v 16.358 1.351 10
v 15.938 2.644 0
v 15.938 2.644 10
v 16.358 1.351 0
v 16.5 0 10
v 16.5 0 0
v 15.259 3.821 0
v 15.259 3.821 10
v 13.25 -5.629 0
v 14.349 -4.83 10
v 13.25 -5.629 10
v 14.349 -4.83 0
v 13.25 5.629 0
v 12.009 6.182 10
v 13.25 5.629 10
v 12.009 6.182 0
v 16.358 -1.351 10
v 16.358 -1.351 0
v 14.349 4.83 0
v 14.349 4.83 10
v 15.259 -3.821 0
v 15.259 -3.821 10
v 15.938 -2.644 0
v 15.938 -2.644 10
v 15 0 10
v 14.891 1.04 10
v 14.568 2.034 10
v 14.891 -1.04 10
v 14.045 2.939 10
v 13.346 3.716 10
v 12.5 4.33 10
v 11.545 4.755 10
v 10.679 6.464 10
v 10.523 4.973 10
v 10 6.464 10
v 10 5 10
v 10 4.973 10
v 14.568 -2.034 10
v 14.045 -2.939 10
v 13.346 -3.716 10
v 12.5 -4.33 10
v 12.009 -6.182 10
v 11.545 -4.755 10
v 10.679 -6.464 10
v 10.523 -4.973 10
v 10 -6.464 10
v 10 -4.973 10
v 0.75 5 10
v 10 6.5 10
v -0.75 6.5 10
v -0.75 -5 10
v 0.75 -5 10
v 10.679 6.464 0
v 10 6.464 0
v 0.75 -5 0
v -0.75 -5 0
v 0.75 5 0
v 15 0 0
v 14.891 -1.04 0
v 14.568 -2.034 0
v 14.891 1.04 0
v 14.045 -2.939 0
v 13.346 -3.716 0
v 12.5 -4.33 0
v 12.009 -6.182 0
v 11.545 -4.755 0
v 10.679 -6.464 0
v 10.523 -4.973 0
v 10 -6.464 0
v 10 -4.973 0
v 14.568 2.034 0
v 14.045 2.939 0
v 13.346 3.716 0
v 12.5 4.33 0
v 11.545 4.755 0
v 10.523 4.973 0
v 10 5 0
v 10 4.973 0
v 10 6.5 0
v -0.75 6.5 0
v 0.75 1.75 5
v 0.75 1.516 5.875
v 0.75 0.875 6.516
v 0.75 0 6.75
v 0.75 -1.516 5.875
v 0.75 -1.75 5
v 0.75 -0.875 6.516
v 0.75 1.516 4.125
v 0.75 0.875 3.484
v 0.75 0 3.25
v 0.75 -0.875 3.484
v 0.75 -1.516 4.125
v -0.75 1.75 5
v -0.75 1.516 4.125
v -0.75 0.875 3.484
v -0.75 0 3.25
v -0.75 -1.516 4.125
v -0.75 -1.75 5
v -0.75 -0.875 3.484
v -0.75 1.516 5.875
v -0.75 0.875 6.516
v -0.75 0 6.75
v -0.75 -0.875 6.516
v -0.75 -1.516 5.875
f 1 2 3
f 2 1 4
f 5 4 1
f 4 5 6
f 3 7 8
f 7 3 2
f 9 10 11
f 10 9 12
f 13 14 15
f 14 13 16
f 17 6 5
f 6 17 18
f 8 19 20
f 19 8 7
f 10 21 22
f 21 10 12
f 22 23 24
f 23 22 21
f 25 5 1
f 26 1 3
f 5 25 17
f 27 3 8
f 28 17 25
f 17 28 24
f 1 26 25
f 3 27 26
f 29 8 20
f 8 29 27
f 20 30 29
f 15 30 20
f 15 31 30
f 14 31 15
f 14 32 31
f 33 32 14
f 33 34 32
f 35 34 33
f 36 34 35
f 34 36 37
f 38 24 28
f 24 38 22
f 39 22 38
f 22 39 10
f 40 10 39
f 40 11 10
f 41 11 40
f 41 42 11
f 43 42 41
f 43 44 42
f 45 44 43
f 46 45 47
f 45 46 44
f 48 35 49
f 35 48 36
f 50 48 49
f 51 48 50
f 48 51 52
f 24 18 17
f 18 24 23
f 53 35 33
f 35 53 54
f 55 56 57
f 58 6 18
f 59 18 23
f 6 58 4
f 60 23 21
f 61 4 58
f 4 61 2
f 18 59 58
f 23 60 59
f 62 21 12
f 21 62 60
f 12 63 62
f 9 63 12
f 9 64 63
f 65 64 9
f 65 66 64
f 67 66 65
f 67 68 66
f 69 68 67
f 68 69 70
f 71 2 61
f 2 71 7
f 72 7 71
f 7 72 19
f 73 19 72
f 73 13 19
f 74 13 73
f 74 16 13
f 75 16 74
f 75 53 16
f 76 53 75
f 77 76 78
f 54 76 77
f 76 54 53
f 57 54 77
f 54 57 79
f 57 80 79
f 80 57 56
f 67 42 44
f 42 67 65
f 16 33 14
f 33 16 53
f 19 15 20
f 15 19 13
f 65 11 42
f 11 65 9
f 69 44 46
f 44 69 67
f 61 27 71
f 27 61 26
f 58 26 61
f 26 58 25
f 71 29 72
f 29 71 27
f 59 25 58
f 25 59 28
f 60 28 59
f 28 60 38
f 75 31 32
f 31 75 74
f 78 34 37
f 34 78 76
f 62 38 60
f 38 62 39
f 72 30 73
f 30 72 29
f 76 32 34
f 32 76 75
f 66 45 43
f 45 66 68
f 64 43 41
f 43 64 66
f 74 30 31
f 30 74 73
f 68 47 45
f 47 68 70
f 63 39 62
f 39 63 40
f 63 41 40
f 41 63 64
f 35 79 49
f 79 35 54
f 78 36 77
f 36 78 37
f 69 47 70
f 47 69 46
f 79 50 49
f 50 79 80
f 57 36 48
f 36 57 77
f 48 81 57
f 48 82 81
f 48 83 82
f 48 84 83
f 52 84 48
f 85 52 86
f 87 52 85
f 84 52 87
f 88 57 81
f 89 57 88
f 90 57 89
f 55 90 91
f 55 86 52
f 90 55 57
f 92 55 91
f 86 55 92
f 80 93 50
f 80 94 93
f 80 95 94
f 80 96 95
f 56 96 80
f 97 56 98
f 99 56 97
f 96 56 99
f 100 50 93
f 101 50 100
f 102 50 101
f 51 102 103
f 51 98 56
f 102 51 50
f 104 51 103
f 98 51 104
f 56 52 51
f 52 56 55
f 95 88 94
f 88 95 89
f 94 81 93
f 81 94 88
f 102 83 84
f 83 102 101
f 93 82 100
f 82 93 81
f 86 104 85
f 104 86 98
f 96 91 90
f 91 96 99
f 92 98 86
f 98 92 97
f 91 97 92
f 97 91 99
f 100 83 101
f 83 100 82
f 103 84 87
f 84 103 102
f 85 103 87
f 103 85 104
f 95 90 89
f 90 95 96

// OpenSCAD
// file: common.scad
//include <RatsoShapeLibrary.scad>



/*
Define settings for each nut/bolt type here
*/

// ### layer height of the printer ###
printer_layer_height = 0.4;

// kludge factor for different print nozzles
printer_oversize = 0.5; // 0.35 nozzle use 0.3; 0.6 nozzle use 0.?
printer_oversizeArc = 0.2; // 0.35 nozzle = ???; 0.6 nozzle = 0.2


// ### M3 ###

M3_boltDiameter = 3.0 + printer_oversize; // actual 3.0
M3_boltDiameterArc = 3.0 + printer_oversizeArc; // used for rotary extruded bolt channel
M3_boltHeadDiameter = 6.0 + printer_oversize; // actual 6
M3_nutHeight = 2.4 + printer_oversize; // actual 2.4
M3_lockNutHeight = 4.0 + printer_oversize; // actual 4.0
M3_nutDiameterMin = 5.5 + printer_oversize; // actual 5.5
M3_nutDiameterMax = (5.5*(1/sin(60))) + printer_oversize; // actual 6
M3_nutDiameterArc = 5.5; // used for rotary extruded nut channel

// eventually standardize this interface??, that would allow for easy switching of bolt/nut sizes
M3_dim = [M3_boltDiameter,M3_nutDiameterMin,M3_nutDiameterMax,M3_nutHeight];


// ### M2 ###

M2_boltDiameter = 2.0 + printer_oversize; // actual 2.0
M2_boltHeadDiameter = 4.0 + printer_oversize; // actual 4
M2_nutHeight = 1.6 + printer_oversize; // actual 1.6
M2_nutDiameterMin = 3.8 + printer_oversize; // actual 4
M2_nutDiameterMax = (4.0*(1/sin(60))) + printer_oversize; // actual 4.5

// eventually standardize this interface??, that would allow for easy switching of bolt/nut sizes
M2_dim = [M2_boltDiameter,M2_nutDiameterMin,M2_nutDiameterMax,M2_nutHeight];

// ### M8 ###
M8_rodDiameter = 8 + printer_oversize;

// ### PI ###
pi = 3.14159265359;



// ### shaft sizes for tight fit ###
woodDowel_quarterInch_diameter = 7.1;
woodDowel_halfInch_diameter = 13.5;
stepperMotor_diameter = 5.0 + printer_oversize; // actual 5.0



//--------




// =========================================================

//trapNutDie(channelHeight=20, holeLength=50, holeOffset=15 );
//trapNutDie(channelHeight=0 ,holeLength=15, holeOffset=0, nutOffset=0 );
// ** this is a brand-new function
module trapNutDie(
	channelHeight=15, 
	holeLength=10, 
	holeOffset=0, 
	nutOffset=0, 
	boltHoleRes=12,
	boltRadius = M3_boltDiameter/2, // DEPRICATE
	mType = 0,
	boltDiameter = M3_boltDiameter,
	nutHeight = M3_nutHeight,
	nutDiameterMin = M3_nutDiameterMin,
	nutDiameterMax = M3_nutDiameterMax,
	horizontal = false // should add a support to the bolt hole, AND (###TODO###) make the nut height a little higher
	){

	if(!horizontal){
		// hex-hole for the nut
		translate([0,-(nutHeight/2),-nutOffset]) rotate([-90,30,0]) cylinder(r=nutDiameterMax/2, h=nutHeight, $fn=6);
		// channel the nut drops into
		translate([-nutDiameterMin/2,-(nutHeight/2),0]) cube([nutDiameterMin,nutHeight,channelHeight]);
	}else{
		// hex-hole for the nut
		translate([0,-(nutHeight/2),-nutOffset]) rotate([-90,30,0]) cylinder(r=nutDiameterMax/2, h=nutHeight+printer_layer_height, $fn=6);
		// channel the nut drops into
		translate([-nutDiameterMin/2,-(nutHeight/2),0]) cube([nutDiameterMin,nutHeight+printer_layer_height,channelHeight]);
	}

	difference(){
		// bolt hole
		translate([0,-(holeLength/2)+holeOffset,0]) rotate([-90,0,0]) cylinder(r=boltDiameter/2, h=holeLength, $fn=boltHoleRes);
		if(horizontal){
			// cutout slice for support (if horizontal)
			rotate([-90,0,0]) translate([0,0,(nutHeight/2)+0.001]) cylinder(r=(boltDiameter/2)+1, h=printer_layer_height*2);
		}
	}
	
}

// =================================

//stumpWithTrapNut(shaftDiameter=stepperMotor_diameter, stumpWallThick=6, nutBlockThick=12);
//stumpWithTrapNut(shaftDiameter=16 + printer_oversize ); // shaft collar for Chad's drum stand
//stumpWithTrapNut(shaftDiameter=woodDowel_halfInch_diameter, stumpWallThick=8, nutBlockThick=0);
//stumpWithTrapNut(shaftDiameter=woodDowel_quarterInch_diameter); // shaftDiameter was 7.3, but a little too loose


module stumpWithTrapNut(
	shaftDiameter = 7.3,
	stumpWallThick = 4,
	nutBlockThick = 8,
	){

	shaftRadius = shaftDiameter/2;
	stumpRadius = shaftRadius + stumpWallThick;
	stumpHeight = 10;

	nutBlockWidth = M3_nutDiameterMax+stumpWallThick;
	nutBlockOffsetY = stumpRadius + nutBlockThick - stumpWallThick;
	stumpTrapNutOffsetY = shaftRadius + ( max( stumpWallThick, nutBlockThick ) / 2.5 );  //nutBlockOffsetY - (nutBlockThick/2); //
	stumpTrapNutOffsetZ = stumpHeight/2;

	trapNutBoltHoleLength = max( nutBlockThick, stumpWallThick );

		// nut stump
			translate([0,0,0]) difference(){
				union(){
					// stump
					translate([0,0,0]) cylinder(r=stumpRadius, h=stumpHeight, center=false);
					// nut block
					translate([-nutBlockWidth/2,-nutBlockOffsetY,0]) cube([nutBlockWidth,nutBlockThick,stumpHeight]);
				}
				// motor shaft
				translate([0,0,(stumpHeight)/2]) cylinder(r=shaftRadius, h=stumpHeight+1, center=true, $fn=shaftDiameter*3);
				// trap nut
				rotate([0,0,0]) translate([0,-stumpTrapNutOffsetY, stumpHeight-stumpTrapNutOffsetZ]) rotate([0,0,0]) trapNutDie(channelHeight=10 ,holeLength=trapNutBoltHoleLength*2, holeOffset=(-trapNutBoltHoleLength)/2 ); //holeOffset=(length/2)+(r1/2)
			} // translate difference
}
// main file
//include<RatsoShapeLibrary.scad>
include<common.scad>


bodyWallThick = 1.5;

aaaBatteryRadius = 5.5;
aaaBatteryLength = 44; // 44 for the battery + spring compression
aaaTerminalWidth = 9; // actual 8; width and height same
aaaTerminalThick = 1.6;
aaaTerminalTabWallWidth = 3.5; 
aaaTerminalTabWallThick = 1.6; 
aaaTerminalTabWallRatio = 0.3; // where the triangle split occurs
//aaaTerminalOpeningWidth1 = (aaaBatteryRadius*2) - 1;
aaaTerminalOpeningWidth = 7;

aaaBatteryCaseSizeOuter = [ 
	(aaaBatteryRadius*2)+(bodyWallThick*2), 
	bodyWallThick+aaaTerminalThick+aaaTerminalTabWallThick+aaaBatteryLength+aaaTerminalThick+aaaTerminalTabWallThick+bodyWallThick, 
	(aaaBatteryRadius*2)+(bodyWallThick*1) 
];

motorBodyDiameter = 7; // actual 7.0
motorBodyLength = 17; 
motorRearPadding = 5; 
motorRearNarrow = 4;
motorShaftRadius = 13;
motorShaftDiameter = motorShaftRadius*2; // should be called "shaftClearance" includes weight, etc. - total clearance, just use the maximum, same as battery
motorShaftLength = 7; // again, total clearance
motorOverallLength = motorRearPadding + motorBodyLength + motorShaftLength;

shaftWeightWallThick = 1.5;
//shaftWeightBaseThick = 0.0;
shaftWeightLength = 5; // the thickness of the weight
shaftWeightIR = 3.53; // motor diam is 7
shaftWeightOR = shaftWeightIR + shaftWeightWallThick; // shaftWeightIR + shaftWeightWallThick;
shaftWeightCutOffset = 1.5; // from center
shaftWeightTailLength = 8;
shaftWeightTailThick = 10;
shaftWeightTailRingIR = 0; // for extra weight
shaftWeightRes = 45;



motorCaseSizeOuter = [ 
	(aaaBatteryRadius*2)+(bodyWallThick*2), 
	bodyWallThick+motorOverallLength+bodyWallThick, 
	(aaaBatteryRadius*2)+(bodyWallThick*1)
];



flexMotorMountBoltHoleOffset = 1; // from center


mountRingOR = 5;
mountRingIR = 2;
caseMountLoopHeight = 3;
caseMountLoopOffsetX = 6;
caseMountLoopOffsetY = mountRingOR;

vibroBotBodySizeOuter = [ 
	(aaaBatteryRadius*2)+(bodyWallThick*2), 
	bodyWallThick+aaaTerminalThick+aaaTerminalTabWallThick+aaaBatteryLength+aaaTerminalThick+aaaTerminalTabWallThick+bodyWallThick+motorOverallLength+bodyWallThick, 
	//bodyWallThick+aaaTerminalThick+aaaTerminalTabWallThick+aaaBatteryLength+aaaTerminalThick+aaaTerminalTabWallThick+bodyWallThick+motorBodyLength, 
	(aaaBatteryRadius*2)+(bodyWallThick*1) 
];

batteryCutoutSize = [ (aaaBatteryRadius*2), aaaBatteryLength, (aaaBatteryRadius*2) ];

extraMotorDrop = 0; // drop the motor down into the case a little more
motorCutoutSize = [ motorBodyDiameter, motorBodyLength+1, motorBodyDiameter+extraMotorDrop ];
motorShaftCutoutSize = [ motorShaftDiameter, motorShaftLength, motorShaftDiameter ];


// "wire" here means wire leg
wireDiameter = 2.5;
wireLockBlockSize = [10,10,10];
wireLockBlockOffsetY = 30; // from center
wireLockBlockOffsetX = 10; // from edge
wireLockBlockNutOffsetZ = 0; // to center the nut over the bolt hole

wireHoleOffsetY =7;
trapNutOffsetY = 4.3;

// "wire" here means ground wire
groundWireRadius = 1.3;
groundWireHoleOffsetX = -1; // from center
groundWireBlockSize = [3.5,3,4];
groundWireBlockOffsets = [2.5,25,50];

// pen holder
penHolderRadius = 5;
penHolderThick = 1.5;
penHolderOffset = 10; // depth of the pen holder
penHolderLegLength = 25;
pivotArmBaseHeight = 20;
pivotArmBaseWidth = 10;
pivotArmLegHeight = 10;
pivotArmLegLength = 20;
pivotArmThick = 1.5;


// 
hexBodyRadius = (aaaBatteryCaseSizeOuter[1]/2) + 10;
hexBodyBaseThick = 1.5;

$fs=1;


// ================================

//batteryTerminalTest();


//vibroBotBody();
//vibroBotShaftWeight();

//vibroBotHexBody(flexMotorMount=true);
//flexMotorCase();
//flexMotorMount();

//wireLockBlock();
//simpleBatteryCase();
//simpleMotorCase();

//pivotArm();
penArm();

// ===================================



module pivotArm(){
	difference(){
		union(){
			translate([ -(pivotArmBaseWidth/2), 0, 0 ]) cube([ pivotArmBaseWidth, pivotArmThick, pivotArmBaseHeight ]);
			translate([-(pivotArmThick/2),pivotArmThick,0]) cube([ pivotArmThick, pivotArmLegLength, pivotArmLegHeight ]);
		}
		// mount hole
		translate([ 0, 0, pivotArmBaseHeight-(pivotArmBaseWidth/2) ]) trapNutDie(channelHeight=0 ,holeLength=15, holeOffset=0, nutOffset=0, nutHeight=0 );
		// pivot hole
		translate([ (pivotArmThick/2), pivotArmLegLength-(pivotArmLegHeight/2), (pivotArmLegHeight/2) ]) rotate([ 0, 0, 90 ]) trapNutDie(channelHeight=0 ,holeLength=15, holeOffset=0, nutOffset=0, nutHeight=pivotArmThick );
	}
}


// -------------------------------------------------------------------------
module penArm(){
	difference(){
		union(){
			translate([penHolderOffset,0,0]) difference() {
				cylinder(r=penHolderRadius+penHolderThick, h=pivotArmLegHeight);
				translate([0,0,-1]) cylinder(r=penHolderRadius, h=pivotArmLegHeight+2);
				translate([-penHolderRadius-penHolderThick-1,-penHolderRadius-penHolderThick-1,-1]) cube([penHolderRadius+penHolderThick+1,penHolderRadius*3,pivotArmLegHeight+2]);
			}
			// arm
			translate([ 0, penHolderRadius, 0 ]) cube([ penHolderOffset, pivotArmThick, pivotArmLegHeight ]);
			// pivot arm
			translate([ -(pivotArmThick/2),-penHolderRadius,0 ]) cube([ pivotArmThick, (penHolderRadius*2)+pivotArmThick, pivotArmLegHeight ]);
		}
		// pivot hole
		translate([ (pivotArmThick/2), 0, (pivotArmLegHeight/2) ]) rotate([ 0, 0, 90 ]) trapNutDie(channelHeight=0 ,holeLength=15, holeOffset=0, nutOffset=0, nutHeight=0 );
	}
}


// -------------------------------------------------------------------------
module simpleMotorCase(){
	difference(){
		// outer cube
		cube(motorCaseSizeOuter);
		translate([ 
			(vibroBotBodySizeOuter[0]-motorBodyDiameter)/2, 
			bodyWallThick, 
			vibroBotBodySizeOuter[2]-motorCutoutSize[2]+0.001]) {
			//
			// cutout for motor
			cube(motorCutoutSize);
			// cutout for the motor shaft (the vibration weight)
			translate([-(motorShaftDiameter-motorBodyDiameter)/2,motorBodyLength,-(motorShaftDiameter-motorBodyDiameter)/2]) cube(motorShaftCutoutSize);		
		} // translate
	}
}

// -------------------------------------------------------------------------
module flexMotorCase(){
	union(){
	difference(){
		// outer cube
		cube(motorCaseSizeOuter);
		// cutout for motor
		translate([ (vibroBotBodySizeOuter[0]-motorBodyDiameter)/2, bodyWallThick, 	vibroBotBodySizeOuter[2]-motorCutoutSize[2]+0.001]) cube(motorCutoutSize);
		// cutoff the motor shaft section
		translate([-1,bodyWallThick+motorBodyLength,-1]) cube([motorCaseSizeOuter[0]+2,motorShaftCutoutSize[1]+bodyWallThick+1,motorCaseSizeOuter[2]+2]);		
	} // difference

	// add joint for hinge
	difference(){
		union(){
			translate([motorCaseSizeOuter[0]/2, -(motorCaseSizeOuter[2]/2)/sin(60), motorCaseSizeOuter[2]/2]) rotate([180,90,0]) rotate([0,0,30]) cylinder(r=(motorCaseSizeOuter[2]/2)/sin(60), h=motorCaseSizeOuter[0]/2, $fn=6);
			// filler cube
			translate([0,-(motorCaseSizeOuter[2]/2)/sin(60),0]) cube([motorCaseSizeOuter[0]/2,(motorCaseSizeOuter[2]/2)/sin(60),motorCaseSizeOuter[2]]); //(motorCaseSizeOuter[2]/2)/sin(60)
		}
		// nut hole 
		translate([(nutHeight/2)-1,-(motorCaseSizeOuter[2]/2)/sin(60),motorCaseSizeOuter[2]/2]) rotate([0,90,0]) rotate([0,0,30]) {
			cylinder(r=nutHoleDiam/2, h=nutHeight+1, center=true,$fn=6);
			//
			cylinder(r=boltDiameter/2, h=motorCaseSizeOuter[0],$fn=6);
		}
	}// difference for hinge hole
	} // union
}
module flexMotorMount(hasNut=false){
	translate([0,0,0]) rotate([-90,0,0]){

	// add joint for hinge
	difference(){
		union(){
			translate([motorCaseSizeOuter[0]/2, -(motorCaseSizeOuter[2]/2)/sin(60), motorCaseSizeOuter[2]/2]) rotate([180,90,0]) rotate([0,0,30]) cylinder(r=(motorCaseSizeOuter[2]/2)/sin(60), h=motorCaseSizeOuter[0]/2, $fn=6);
			// filler cube
			translate([0,-(motorCaseSizeOuter[2]/2)/sin(60),0]) cube([motorCaseSizeOuter[0]/2,(motorCaseSizeOuter[2]/2)/sin(60),motorCaseSizeOuter[2]]); //(motorCaseSizeOuter[2]/2)/sin(60)
		}
		
		translate([-1,-(motorCaseSizeOuter[2]/2)/sin(60)-flexMotorMountBoltHoleOffset, (motorCaseSizeOuter[2]/2) ]) rotate([0,90,0]) rotate([0,0,30]) {
			// nut hole 
			if(hasNut){ cylinder(r=nutHoleDiam/2, h=nutHeight+1, center=false,$fn=6); }
			// bolt hole
			cylinder(r=boltDiameter/2, h=motorCaseSizeOuter[0],$fn=6);
		}
	}// difference for hinge hole
	}// translate all

}

// -------------------------------------------------------------------------
module simpleBatteryCase(){
	difference(){
		// outer cube
		cube(aaaBatteryCaseSizeOuter);
		// cutout for battery
		translate([bodyWallThick,bodyWallThick+aaaTerminalThick+aaaTerminalTabWallThick,bodyWallThick+0.001]) cube(batteryCutoutSize);
		// cutout for battery terminals
		translate([ (vibroBotBodySizeOuter[0]-aaaTerminalWidth)/2, bodyWallThick, (vibroBotBodySizeOuter[2]-aaaTerminalWidth)/2 ]) cube([ aaaTerminalWidth, aaaTerminalThick, aaaTerminalWidth*2 ]);
		translate([ (vibroBotBodySizeOuter[0]-aaaTerminalOpeningWidth)/2, bodyWallThick+aaaTerminalThick-0.01, (vibroBotBodySizeOuter[2]-aaaTerminalWidth)/2 ]) cube([ aaaTerminalOpeningWidth, aaaTerminalTabWallThick+0.02, aaaTerminalWidth*2 ]);
		
		translate([ (vibroBotBodySizeOuter[0]-aaaTerminalWidth)/2, bodyWallThick+aaaTerminalThick+aaaTerminalTabWallThick+batteryCutoutSize[1]+aaaTerminalTabWallThick, (vibroBotBodySizeOuter[2]-aaaTerminalWidth)/2 ]) cube([ aaaTerminalWidth, aaaTerminalThick, aaaTerminalWidth*2 ]);
		translate([ (vibroBotBodySizeOuter[0]-aaaTerminalOpeningWidth)/2, bodyWallThick+aaaTerminalThick+aaaTerminalTabWallThick+batteryCutoutSize[1]-0.01, (vibroBotBodySizeOuter[2]-aaaTerminalWidth)/2 ]) cube([ aaaTerminalOpeningWidth, aaaTerminalTabWallThick+0.02, aaaTerminalWidth*2 ]);
	}
}

// -------------------------------------------------------------------------
module vibroBotHexBody(flexMotorMount=false){
	difference(){
		union(){
			//
			cylinder(r=hexBodyRadius, h=hexBodyBaseThick);
			//  battery
			translate([-aaaBatteryCaseSizeOuter[0]+(bodyWallThick/2),-aaaBatteryCaseSizeOuter[1]/2,hexBodyBaseThick-bodyWallThick]) simpleBatteryCase();
			// motor
			if(flexMotorMount){
				translate([3,-motorCaseSizeOuter[1]/2,hexBodyBaseThick-bodyWallThick]) flexMotorCase();
			}else{
				translate([-(bodyWallThick/2),-motorCaseSizeOuter[1]/2,hexBodyBaseThick-bodyWallThick]) simpleMotorCase();
			}
			//
			for(i = [1:7]){
				rotate([0,0,(360/6)*i]) translate([-wireLockBlockSize[0]/2,-hexBodyRadius,hexBodyBaseThick]) wireLockBlock();
			} // for
		} // union

		//wireHoleOffsetY
		for(i = [1:7]){
			rotate([0,0,(360/6)*i]) translate([0,-hexBodyRadius+wireHoleOffsetY,-1]) cylinder(r=wireDiameter/2, h=hexBodyBaseThick+2);
		} // for

	} // difference
}

// -------------------------------------------------------------------------

module vibroBotShaftWeight(){
	$fn=shaftWeightRes;
		difference(){
			union(){
				// outer cylinder
				cylinder( r=shaftWeightOR, h=shaftWeightLength );
				// add weight/fin/whatever you call it
				//translate([ -shaftWeightTailThick/2, -shaftWeightTailLength-shaftWeightIR, 0 ]) cube([ shaftWeightTailThick, shaftWeightTailLength+shaftWeightIR, shaftWeightLength ]); 
				 translate([ 0, -shaftWeightIR-shaftWeightTailLength+shaftWeightTailThick/2, 0 ]) cam( shaftWeightTailThick/2, shaftWeightOR, shaftWeightTailLength, shaftWeightLength ); 
			}
			// cutoff flat side of outer
			translate([-shaftWeightOR-1,shaftWeightCutOffset+shaftWeightWallThick,-1]) cube([(shaftWeightOR*2)+2,shaftWeightOR,motorShaftLength+shaftWeightWallThick+2]);
			translate([0,0,-1]) difference() {
				// inner cylinder
				cylinder( r=shaftWeightIR, h=shaftWeightLength+2 );
				// cutoff flat side of inner
				translate([-shaftWeightIR*2,shaftWeightCutOffset,-1]) cube([(shaftWeightIR*4),shaftWeightIR,shaftWeightLength+4]);
			}
		}
	
	if(shaftWeightTailRingIR>0){
	// add ring
	translate([ 0, -shaftWeightOR-shaftWeightTailLength-shaftWeightTailRingIR-(shaftWeightWallThick/2), 0 ]) difference(){
		// outer
		cylinder( r=shaftWeightTailRingIR+shaftWeightWallThick, h=shaftWeightLength );
		// inner
		translate([ 0, 0, -1 ]) cylinder( r=shaftWeightTailRingIR, h=shaftWeightLength+2 );
	}
	}
}

// -------------------------------------------------------------------------

module vibroBotBody(){
		//
	//	
	union(){
	difference(){

		union(){
			cube(vibroBotBodySizeOuter);
			
			// the wire-leg mount blocks
			// left side
			translate([ -wireLockBlockSize[0]-wireLockBlockOffsetX, ((vibroBotBodySizeOuter[1]-wireLockBlockSize[1])/2)-wireLockBlockOffsetY, 0 ]) {
				rotate([0,0,-90]) mirror([1,0,0]) wireLockBlock();
				translate([wireLockBlockSize[0]-0.001,0,0]) cube([wireLockBlockOffsetX+0.002,wireLockBlockSize[1],wireLockBlockSize[2]/2]);// add hip
			}
			translate([ -wireLockBlockSize[0]-wireLockBlockOffsetX, ((vibroBotBodySizeOuter[1]-wireLockBlockSize[1])/2)+wireLockBlockOffsetY, 0 ]) {
				rotate([0,0,-90]) mirror([1,0,0]) wireLockBlock();
				translate([wireLockBlockSize[0]-0.001,0,0]) cube([wireLockBlockOffsetX+0.002,wireLockBlockSize[1],wireLockBlockSize[2]/2]);// add hip
			}
			// right side
			translate([  vibroBotBodySizeOuter[0]+wireLockBlockSize[0]+wireLockBlockOffsetX, ((vibroBotBodySizeOuter[1]-wireLockBlockSize[1])/2)-wireLockBlockOffsetY, 0 ]) {
				rotate([0,0,90]) mirror([0,0,0]) wireLockBlock();
				translate([-wireLockBlockSize[0]-wireLockBlockOffsetX-0.001,0,0]) cube([wireLockBlockOffsetX+0.002,wireLockBlockSize[1],wireLockBlockSize[2]/2]);// add hip
			}
			translate([  vibroBotBodySizeOuter[0]+wireLockBlockSize[0]+wireLockBlockOffsetX, ((vibroBotBodySizeOuter[1]-wireLockBlockSize[1])/2)+wireLockBlockOffsetY, 0 ]) {
				rotate([0,0,90]) mirror([0,0,0]) wireLockBlock();
				translate([-wireLockBlockSize[0]-wireLockBlockOffsetX-0.001,0,0]) cube([wireLockBlockOffsetX+0.002,wireLockBlockSize[1],wireLockBlockSize[2]/2]);// add hip
			}
			// front end
			translate([ (vibroBotBodySizeOuter[0]-wireLockBlockSize[0])/2, vibroBotBodySizeOuter[1]+wireLockBlockSize[1], 0 ]) {
				rotate([0,0,0]) mirror([0,1,0]) wireLockBlock();
			}
			// rear end
			translate([ (vibroBotBodySizeOuter[0]-wireLockBlockSize[0])/2, -wireLockBlockSize[1], 0 ]) {
				rotate([0,0,0]) mirror([0,0,0]) wireLockBlock();
			}

			// ground wire channel
			translate([vibroBotBodySizeOuter[0],0,vibroBotBodySizeOuter[2]-groundWireBlockSize[2]]) {
				groundWireBlock(groundWireBlockOffsets[0]);
				groundWireBlock(groundWireBlockOffsets[1]);
				groundWireBlock(groundWireBlockOffsets[2]);
			}

			// lump for motor shaft
			translate([ ((vibroBotBodySizeOuter[0]-motorShaftCutoutSize[0])/2)-bodyWallThick, vibroBotBodySizeOuter[1]-(bodyWallThick*2)-motorShaftCutoutSize[1], 0 ]) cube([ motorShaftCutoutSize[0]+(bodyWallThick*2), motorShaftCutoutSize[1]+(bodyWallThick*2), vibroBotBodySizeOuter[2] ]);
		
		}//union - main body
		

		// cutout for motor
		translate([ 
			(vibroBotBodySizeOuter[0]-motorBodyDiameter)/2, 
			bodyWallThick+aaaTerminalThick+aaaTerminalTabWallThick+batteryCutoutSize[1]+aaaTerminalThick+aaaTerminalTabWallThick+bodyWallThick, 
			vibroBotBodySizeOuter[2]-motorCutoutSize[2]+0.001]) {
			//motorRearPadding
			translate([ (motorCutoutSize[0]-motorRearNarrow)/2, 0, 0 ]) trapazoid( motorRearNarrow, motorCutoutSize[0], motorRearPadding+0.001, motorCutoutSize[2] );
			//
			translate([ 0, motorRearPadding, 0 ]) cube(motorCutoutSize);
			// cutout for the motor shaft (the vibration weight)
			translate([-(motorShaftDiameter-motorBodyDiameter)/2,motorRearPadding+motorBodyLength,-(motorShaftDiameter-motorBodyDiameter)/2]) cube(motorShaftCutoutSize);
		}

	
		// cutout for battery
		translate([bodyWallThick,bodyWallThick+aaaTerminalThick+aaaTerminalTabWallThick,bodyWallThick+0.001]) cube(batteryCutoutSize);

		// cutout for battery terminals

		// REAR
		translate([ 0, bodyWallThick, bodyWallThick ]) aaaBatteryTerminalCutout();

		// FRONT
		translate([ 
			0,//vibroBotBodySizeOuter[0], 
			bodyWallThick+aaaTerminalThick+aaaTerminalTabWallThick+batteryCutoutSize[1]+aaaTerminalThick+aaaTerminalTabWallThick, 
			bodyWallThick
			]) mirror([ 0, 1, 0 ]) aaaBatteryTerminalCutout();//rotate([ 0,0,180 ])
			
			
	} // difference


	
	} // union

}






// -------------------------------------------------------

module batteryTerminalTest(){
	//
	difference(){
	cube([ vibroBotBodySizeOuter[0], 10, vibroBotBodySizeOuter[2] ]);
	translate([ 0, bodyWallThick, bodyWallThick ]) aaaBatteryTerminalCutout();
	translate([ bodyWallThick, bodyWallThick+aaaTerminalThick+aaaTerminalTabWallThick, bodyWallThick]) cube(batteryCutoutSize);
	}//difference
}

module aaaBatteryTerminalCutout(){
	union(){
		//
		translate([ (vibroBotBodySizeOuter[0]-aaaTerminalWidth)/2, 0, max( 0, (vibroBotBodySizeOuter[2]-aaaTerminalWidth)/2 ) ]) cube([ aaaTerminalWidth, aaaTerminalThick, vibroBotBodySizeOuter[2] ]);

		//
		translate([ (vibroBotBodySizeOuter[0]-aaaTerminalWidth)/2, aaaTerminalThick-0.001, 0 ]) trapazoid( aaaTerminalWidth, (batteryCutoutSize[0]-aaaTerminalTabWallWidth)/2, (aaaTerminalTabWallThick*aaaTerminalTabWallRatio)+0.002, vibroBotBodySizeOuter[2]+2 );
		translate([ (vibroBotBodySizeOuter[0]-((batteryCutoutSize[0]-aaaTerminalTabWallWidth)/2))/2,  aaaTerminalThick+(aaaTerminalTabWallThick*aaaTerminalTabWallRatio), 0 ]) trapazoid( (batteryCutoutSize[0]-aaaTerminalTabWallWidth)/2, batteryCutoutSize[0], (aaaTerminalTabWallThick*(1-aaaTerminalTabWallRatio))+0.001, vibroBotBodySizeOuter[2]+2 );

		// 
		translate([ (vibroBotBodySizeOuter[0]-aaaTerminalOpeningWidth)/2, aaaTerminalThick-0.001, 0 ]) cube([ aaaTerminalOpeningWidth, aaaTerminalThick, vibroBotBodySizeOuter[2] ]);

	}//union
}



// -------------------------------------------------------


module groundWireBlock(offsetY){
	translate([0,offsetY,0]) union(){
		difference(){
			cube(groundWireBlockSize);
			// hole for wire
			translate([(groundWireBlockSize[0]/2)+groundWireHoleOffsetX,-1,groundWireBlockSize[2]/2]) rotate([-90,0,0]) cylinder(r=groundWireRadius, h=groundWireBlockSize[1]+2, $fn=6);
		}
		// support, rightTriangle(size[x,y,z])
		translate([0,0,0]) rotate([-90,0,0]) rightTriangle([ groundWireBlockSize[0], groundWireBlockSize[0], groundWireBlockSize[1] ]);
	}
}


module makeCaseLoop(){
	difference(){
		translate([mountRingOR,0,0]) rotate([0,0,90]) cam( mountRingOR, mountRingOR, caseMountLoopOffsetX+(mountRingOR), caseMountLoopHeight );
		translate([-caseMountLoopOffsetX,0,-1]) cylinder(r=mountRingIR, h=caseMountLoopHeight+2);
	}
}


module wireLockBlock( wireRad=wireDiameter/2, boltRad=boltDiameter/2 ){
	difference(){
		cube(wireLockBlockSize);
		translate([ wireLockBlockSize[0]/2, wireHoleOffsetY, -1 ]) cylinder(r=wireRad, h=wireLockBlockSize[2]+2);
		translate([ wireLockBlockSize[0]/2, trapNutOffsetY, wireLockBlockSize[2]/2 ]) trapNutDie(channelHeight=wireLockBlockSize[2], holeOffset=-1, holeLength=9.5, nutOffset=wireLockBlockNutOffsetZ);
	}
}


/*
module miniCaseBoltBlock(boosterHeight=3){
	blockUnderDepth = boosterHeight;

	translate([0,0,blockUnderDepth+(nutBlockDepth/2)]){
			union(){
				rotate([ 90,0,180 ]) difference() {
					union() translate([ -(nutBlockWidth/2), -(nutBlockDepth/2), 0 ]) {				
						// nut block body
						translate([0,0,0.01]) cube([ nutBlockWidth, nutBlockDepth, nutBlockHeight ]); // the nut-block
						// under block
						if(blockUnderDepth>0){translate([0,-blockUnderDepth+0.01,0.01]) cube([nutBlockWidth,blockUnderDepth,nutBlockHeight]);}
					}//union
					// trap-nut 
					translate([ 0, 0, panelBoltHoleEdgeOffset ]) trapNutDie( holeLength=(nutBlockDepth+blockUnderDepth+0.01), nutHeight=nutHoleHeightHoriz );
				} rotate() difference()
				// support for the bolt-hole
				translate([0,(nutBlockHeight/2), (nutHoleHeightHoriz/2)]) cylinder(r=(boltDiameter/2)+0.1, h=boltHoleSupportThick);
			}// union
	}// translate
}
*/
